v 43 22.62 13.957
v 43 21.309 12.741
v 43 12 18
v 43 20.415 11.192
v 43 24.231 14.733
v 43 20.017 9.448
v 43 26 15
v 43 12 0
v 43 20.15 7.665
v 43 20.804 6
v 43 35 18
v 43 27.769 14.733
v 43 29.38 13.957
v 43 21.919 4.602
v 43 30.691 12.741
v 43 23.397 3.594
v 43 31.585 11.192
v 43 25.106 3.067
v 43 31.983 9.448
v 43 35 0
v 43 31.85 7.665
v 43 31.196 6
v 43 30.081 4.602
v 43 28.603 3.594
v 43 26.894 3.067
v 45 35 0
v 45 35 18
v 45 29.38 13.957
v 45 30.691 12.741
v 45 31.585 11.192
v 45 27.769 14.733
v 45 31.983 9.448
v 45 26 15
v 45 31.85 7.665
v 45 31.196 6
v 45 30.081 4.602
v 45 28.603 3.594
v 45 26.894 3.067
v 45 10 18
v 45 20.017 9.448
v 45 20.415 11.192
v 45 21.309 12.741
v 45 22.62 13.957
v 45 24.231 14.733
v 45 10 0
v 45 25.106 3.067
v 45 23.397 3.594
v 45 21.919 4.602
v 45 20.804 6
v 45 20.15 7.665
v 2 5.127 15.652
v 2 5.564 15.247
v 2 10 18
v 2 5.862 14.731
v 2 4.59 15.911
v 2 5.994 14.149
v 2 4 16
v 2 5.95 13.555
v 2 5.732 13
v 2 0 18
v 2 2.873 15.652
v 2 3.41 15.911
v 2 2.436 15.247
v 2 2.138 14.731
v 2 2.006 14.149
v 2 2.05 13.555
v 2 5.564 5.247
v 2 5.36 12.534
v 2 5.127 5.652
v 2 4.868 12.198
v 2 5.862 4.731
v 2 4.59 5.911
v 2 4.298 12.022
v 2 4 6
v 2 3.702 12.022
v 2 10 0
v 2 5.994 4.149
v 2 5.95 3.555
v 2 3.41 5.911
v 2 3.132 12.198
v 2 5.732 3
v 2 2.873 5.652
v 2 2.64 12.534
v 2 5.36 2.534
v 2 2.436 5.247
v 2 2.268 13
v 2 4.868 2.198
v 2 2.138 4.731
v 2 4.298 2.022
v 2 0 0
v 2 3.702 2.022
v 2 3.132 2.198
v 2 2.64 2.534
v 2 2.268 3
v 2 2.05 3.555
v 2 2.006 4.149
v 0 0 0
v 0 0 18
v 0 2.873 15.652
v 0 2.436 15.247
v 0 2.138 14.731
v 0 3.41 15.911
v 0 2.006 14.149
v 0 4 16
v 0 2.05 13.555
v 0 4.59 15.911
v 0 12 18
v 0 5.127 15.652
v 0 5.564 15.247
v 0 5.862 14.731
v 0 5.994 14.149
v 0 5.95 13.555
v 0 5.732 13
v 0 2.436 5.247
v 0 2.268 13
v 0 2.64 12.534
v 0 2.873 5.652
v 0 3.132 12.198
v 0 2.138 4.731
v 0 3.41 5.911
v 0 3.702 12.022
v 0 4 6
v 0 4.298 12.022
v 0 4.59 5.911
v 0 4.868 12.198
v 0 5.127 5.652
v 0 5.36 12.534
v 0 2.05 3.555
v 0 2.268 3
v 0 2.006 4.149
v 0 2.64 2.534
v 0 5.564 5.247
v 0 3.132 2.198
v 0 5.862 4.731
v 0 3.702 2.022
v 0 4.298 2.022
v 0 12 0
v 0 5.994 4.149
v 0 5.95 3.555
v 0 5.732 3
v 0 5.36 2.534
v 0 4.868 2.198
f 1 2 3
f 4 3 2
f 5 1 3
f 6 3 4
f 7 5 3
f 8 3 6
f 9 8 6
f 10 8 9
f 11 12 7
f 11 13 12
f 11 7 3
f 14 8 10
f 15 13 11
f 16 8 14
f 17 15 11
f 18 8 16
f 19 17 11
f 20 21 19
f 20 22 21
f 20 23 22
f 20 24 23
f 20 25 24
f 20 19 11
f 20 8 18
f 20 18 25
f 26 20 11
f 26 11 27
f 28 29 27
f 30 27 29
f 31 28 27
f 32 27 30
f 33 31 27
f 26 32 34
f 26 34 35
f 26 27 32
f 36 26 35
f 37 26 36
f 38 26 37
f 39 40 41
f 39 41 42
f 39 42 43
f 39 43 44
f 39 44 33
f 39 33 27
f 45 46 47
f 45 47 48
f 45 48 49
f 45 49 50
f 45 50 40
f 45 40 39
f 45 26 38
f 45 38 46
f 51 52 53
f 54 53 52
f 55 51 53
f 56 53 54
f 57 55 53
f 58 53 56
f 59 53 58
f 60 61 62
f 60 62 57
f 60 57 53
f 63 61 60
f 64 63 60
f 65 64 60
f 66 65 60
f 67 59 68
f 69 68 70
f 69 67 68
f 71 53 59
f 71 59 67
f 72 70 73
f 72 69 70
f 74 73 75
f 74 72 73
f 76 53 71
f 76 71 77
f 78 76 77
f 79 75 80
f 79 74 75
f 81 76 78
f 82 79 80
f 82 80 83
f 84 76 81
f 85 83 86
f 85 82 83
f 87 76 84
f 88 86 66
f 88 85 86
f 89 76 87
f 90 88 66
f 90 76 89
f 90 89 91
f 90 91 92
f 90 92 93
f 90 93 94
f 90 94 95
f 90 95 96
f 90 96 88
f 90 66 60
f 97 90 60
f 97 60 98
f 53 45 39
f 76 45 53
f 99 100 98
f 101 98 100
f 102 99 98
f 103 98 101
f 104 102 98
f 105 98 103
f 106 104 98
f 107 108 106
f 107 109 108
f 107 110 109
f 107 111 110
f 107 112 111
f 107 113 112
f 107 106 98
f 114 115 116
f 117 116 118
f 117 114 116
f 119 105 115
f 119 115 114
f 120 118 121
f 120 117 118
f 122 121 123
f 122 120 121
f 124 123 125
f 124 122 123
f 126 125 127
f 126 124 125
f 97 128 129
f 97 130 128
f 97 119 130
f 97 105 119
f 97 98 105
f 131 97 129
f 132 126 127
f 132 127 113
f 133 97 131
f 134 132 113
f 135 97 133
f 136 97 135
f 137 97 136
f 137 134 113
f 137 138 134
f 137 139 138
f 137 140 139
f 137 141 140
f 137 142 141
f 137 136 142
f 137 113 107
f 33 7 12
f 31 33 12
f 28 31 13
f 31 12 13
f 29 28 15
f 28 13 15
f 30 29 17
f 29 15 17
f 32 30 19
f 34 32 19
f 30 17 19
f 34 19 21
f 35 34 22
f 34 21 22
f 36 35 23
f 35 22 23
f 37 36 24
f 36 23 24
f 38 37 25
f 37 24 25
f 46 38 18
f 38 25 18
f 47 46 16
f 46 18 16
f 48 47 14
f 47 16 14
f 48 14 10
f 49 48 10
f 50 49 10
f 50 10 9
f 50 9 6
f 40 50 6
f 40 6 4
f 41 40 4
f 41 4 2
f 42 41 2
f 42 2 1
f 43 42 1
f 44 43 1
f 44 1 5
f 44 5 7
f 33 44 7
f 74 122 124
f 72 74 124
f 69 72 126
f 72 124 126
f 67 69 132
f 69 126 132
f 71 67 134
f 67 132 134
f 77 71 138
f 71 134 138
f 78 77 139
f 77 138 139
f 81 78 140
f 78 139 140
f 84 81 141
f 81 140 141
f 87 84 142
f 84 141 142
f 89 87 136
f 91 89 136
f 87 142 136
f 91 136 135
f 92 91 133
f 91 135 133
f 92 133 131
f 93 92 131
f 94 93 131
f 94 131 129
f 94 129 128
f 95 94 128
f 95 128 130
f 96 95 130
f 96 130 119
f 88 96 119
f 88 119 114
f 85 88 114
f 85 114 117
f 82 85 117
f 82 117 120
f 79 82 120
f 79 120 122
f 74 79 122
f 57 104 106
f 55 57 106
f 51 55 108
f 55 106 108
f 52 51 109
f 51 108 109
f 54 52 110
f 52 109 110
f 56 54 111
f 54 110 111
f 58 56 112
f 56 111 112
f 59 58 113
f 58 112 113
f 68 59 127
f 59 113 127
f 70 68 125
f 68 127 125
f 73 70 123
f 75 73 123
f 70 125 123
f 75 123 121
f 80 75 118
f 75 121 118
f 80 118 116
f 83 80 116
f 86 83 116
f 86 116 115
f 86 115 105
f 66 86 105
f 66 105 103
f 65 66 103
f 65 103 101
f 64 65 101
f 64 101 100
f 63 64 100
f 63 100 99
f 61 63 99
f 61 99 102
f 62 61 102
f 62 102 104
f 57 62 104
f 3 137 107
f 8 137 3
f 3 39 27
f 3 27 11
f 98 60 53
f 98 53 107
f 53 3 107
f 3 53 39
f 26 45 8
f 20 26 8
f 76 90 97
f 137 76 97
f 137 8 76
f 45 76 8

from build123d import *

# Parameters (mm, degrees)
BOSS_EXTRUDE1_DEPTH = 18
CUT_EXTRUDE1_REACH  = 47
SKETCH2_R           = 2
CUT_EXTRUDE2_REACH  = 4
SKETCH3_R           = 6


with BuildPart() as part:
    # Sketch1 → Boss-Extrude1 (new body)
    with BuildSketch(Plane.XY):
        Polygon((0, 0), (0, 12), (43, 12), (43, 35), (45, 35), (45, 10), (2, 10), (2, 0), align=None)
    extrude(amount=BOSS_EXTRUDE1_DEPTH)

    # Sketch2 → Cut-Extrude1 (cut, up to next)
    with BuildSketch(Plane.ZY, mode=Mode.PRIVATE) as cut_extrude1_sk1:
        with Locations((4, 4)):
            Circle(SKETCH2_R)
    cut_extrude1_tool1 = extrude(cut_extrude1_sk1.sketch, amount=-CUT_EXTRUDE1_REACH, mode=Mode.PRIVATE) & part.part
    add(cut_extrude1_tool1.solids().sort_by_distance((0, 4, 4))[0], mode=Mode.SUBTRACT)
    # Sketch2 → Cut-Extrude1 (cut, up to next)
    with BuildSketch(Plane.ZY, mode=Mode.PRIVATE) as cut_extrude1_sk2:
        with Locations((14, 4)):
            Circle(SKETCH2_R)
    cut_extrude1_tool2 = extrude(cut_extrude1_sk2.sketch, amount=-CUT_EXTRUDE1_REACH, mode=Mode.PRIVATE) & part.part
    add(cut_extrude1_tool2.solids().sort_by_distance((0, 4, 14))[0], mode=Mode.SUBTRACT)

    # Sketch3 → Cut-Extrude2 (cut, up to next)
    with BuildSketch(Plane.ZY.offset(-43), mode=Mode.PRIVATE) as cut_extrude2_sk1:
        with Locations((9, 26)):
            Circle(SKETCH3_R)
    cut_extrude2_tool1 = extrude(cut_extrude2_sk1.sketch, amount=-CUT_EXTRUDE2_REACH, mode=Mode.PRIVATE) & part.part
    add(cut_extrude2_tool1.solids().sort_by_distance((43, 26, 9))[0], mode=Mode.SUBTRACT)


solid = part.part
